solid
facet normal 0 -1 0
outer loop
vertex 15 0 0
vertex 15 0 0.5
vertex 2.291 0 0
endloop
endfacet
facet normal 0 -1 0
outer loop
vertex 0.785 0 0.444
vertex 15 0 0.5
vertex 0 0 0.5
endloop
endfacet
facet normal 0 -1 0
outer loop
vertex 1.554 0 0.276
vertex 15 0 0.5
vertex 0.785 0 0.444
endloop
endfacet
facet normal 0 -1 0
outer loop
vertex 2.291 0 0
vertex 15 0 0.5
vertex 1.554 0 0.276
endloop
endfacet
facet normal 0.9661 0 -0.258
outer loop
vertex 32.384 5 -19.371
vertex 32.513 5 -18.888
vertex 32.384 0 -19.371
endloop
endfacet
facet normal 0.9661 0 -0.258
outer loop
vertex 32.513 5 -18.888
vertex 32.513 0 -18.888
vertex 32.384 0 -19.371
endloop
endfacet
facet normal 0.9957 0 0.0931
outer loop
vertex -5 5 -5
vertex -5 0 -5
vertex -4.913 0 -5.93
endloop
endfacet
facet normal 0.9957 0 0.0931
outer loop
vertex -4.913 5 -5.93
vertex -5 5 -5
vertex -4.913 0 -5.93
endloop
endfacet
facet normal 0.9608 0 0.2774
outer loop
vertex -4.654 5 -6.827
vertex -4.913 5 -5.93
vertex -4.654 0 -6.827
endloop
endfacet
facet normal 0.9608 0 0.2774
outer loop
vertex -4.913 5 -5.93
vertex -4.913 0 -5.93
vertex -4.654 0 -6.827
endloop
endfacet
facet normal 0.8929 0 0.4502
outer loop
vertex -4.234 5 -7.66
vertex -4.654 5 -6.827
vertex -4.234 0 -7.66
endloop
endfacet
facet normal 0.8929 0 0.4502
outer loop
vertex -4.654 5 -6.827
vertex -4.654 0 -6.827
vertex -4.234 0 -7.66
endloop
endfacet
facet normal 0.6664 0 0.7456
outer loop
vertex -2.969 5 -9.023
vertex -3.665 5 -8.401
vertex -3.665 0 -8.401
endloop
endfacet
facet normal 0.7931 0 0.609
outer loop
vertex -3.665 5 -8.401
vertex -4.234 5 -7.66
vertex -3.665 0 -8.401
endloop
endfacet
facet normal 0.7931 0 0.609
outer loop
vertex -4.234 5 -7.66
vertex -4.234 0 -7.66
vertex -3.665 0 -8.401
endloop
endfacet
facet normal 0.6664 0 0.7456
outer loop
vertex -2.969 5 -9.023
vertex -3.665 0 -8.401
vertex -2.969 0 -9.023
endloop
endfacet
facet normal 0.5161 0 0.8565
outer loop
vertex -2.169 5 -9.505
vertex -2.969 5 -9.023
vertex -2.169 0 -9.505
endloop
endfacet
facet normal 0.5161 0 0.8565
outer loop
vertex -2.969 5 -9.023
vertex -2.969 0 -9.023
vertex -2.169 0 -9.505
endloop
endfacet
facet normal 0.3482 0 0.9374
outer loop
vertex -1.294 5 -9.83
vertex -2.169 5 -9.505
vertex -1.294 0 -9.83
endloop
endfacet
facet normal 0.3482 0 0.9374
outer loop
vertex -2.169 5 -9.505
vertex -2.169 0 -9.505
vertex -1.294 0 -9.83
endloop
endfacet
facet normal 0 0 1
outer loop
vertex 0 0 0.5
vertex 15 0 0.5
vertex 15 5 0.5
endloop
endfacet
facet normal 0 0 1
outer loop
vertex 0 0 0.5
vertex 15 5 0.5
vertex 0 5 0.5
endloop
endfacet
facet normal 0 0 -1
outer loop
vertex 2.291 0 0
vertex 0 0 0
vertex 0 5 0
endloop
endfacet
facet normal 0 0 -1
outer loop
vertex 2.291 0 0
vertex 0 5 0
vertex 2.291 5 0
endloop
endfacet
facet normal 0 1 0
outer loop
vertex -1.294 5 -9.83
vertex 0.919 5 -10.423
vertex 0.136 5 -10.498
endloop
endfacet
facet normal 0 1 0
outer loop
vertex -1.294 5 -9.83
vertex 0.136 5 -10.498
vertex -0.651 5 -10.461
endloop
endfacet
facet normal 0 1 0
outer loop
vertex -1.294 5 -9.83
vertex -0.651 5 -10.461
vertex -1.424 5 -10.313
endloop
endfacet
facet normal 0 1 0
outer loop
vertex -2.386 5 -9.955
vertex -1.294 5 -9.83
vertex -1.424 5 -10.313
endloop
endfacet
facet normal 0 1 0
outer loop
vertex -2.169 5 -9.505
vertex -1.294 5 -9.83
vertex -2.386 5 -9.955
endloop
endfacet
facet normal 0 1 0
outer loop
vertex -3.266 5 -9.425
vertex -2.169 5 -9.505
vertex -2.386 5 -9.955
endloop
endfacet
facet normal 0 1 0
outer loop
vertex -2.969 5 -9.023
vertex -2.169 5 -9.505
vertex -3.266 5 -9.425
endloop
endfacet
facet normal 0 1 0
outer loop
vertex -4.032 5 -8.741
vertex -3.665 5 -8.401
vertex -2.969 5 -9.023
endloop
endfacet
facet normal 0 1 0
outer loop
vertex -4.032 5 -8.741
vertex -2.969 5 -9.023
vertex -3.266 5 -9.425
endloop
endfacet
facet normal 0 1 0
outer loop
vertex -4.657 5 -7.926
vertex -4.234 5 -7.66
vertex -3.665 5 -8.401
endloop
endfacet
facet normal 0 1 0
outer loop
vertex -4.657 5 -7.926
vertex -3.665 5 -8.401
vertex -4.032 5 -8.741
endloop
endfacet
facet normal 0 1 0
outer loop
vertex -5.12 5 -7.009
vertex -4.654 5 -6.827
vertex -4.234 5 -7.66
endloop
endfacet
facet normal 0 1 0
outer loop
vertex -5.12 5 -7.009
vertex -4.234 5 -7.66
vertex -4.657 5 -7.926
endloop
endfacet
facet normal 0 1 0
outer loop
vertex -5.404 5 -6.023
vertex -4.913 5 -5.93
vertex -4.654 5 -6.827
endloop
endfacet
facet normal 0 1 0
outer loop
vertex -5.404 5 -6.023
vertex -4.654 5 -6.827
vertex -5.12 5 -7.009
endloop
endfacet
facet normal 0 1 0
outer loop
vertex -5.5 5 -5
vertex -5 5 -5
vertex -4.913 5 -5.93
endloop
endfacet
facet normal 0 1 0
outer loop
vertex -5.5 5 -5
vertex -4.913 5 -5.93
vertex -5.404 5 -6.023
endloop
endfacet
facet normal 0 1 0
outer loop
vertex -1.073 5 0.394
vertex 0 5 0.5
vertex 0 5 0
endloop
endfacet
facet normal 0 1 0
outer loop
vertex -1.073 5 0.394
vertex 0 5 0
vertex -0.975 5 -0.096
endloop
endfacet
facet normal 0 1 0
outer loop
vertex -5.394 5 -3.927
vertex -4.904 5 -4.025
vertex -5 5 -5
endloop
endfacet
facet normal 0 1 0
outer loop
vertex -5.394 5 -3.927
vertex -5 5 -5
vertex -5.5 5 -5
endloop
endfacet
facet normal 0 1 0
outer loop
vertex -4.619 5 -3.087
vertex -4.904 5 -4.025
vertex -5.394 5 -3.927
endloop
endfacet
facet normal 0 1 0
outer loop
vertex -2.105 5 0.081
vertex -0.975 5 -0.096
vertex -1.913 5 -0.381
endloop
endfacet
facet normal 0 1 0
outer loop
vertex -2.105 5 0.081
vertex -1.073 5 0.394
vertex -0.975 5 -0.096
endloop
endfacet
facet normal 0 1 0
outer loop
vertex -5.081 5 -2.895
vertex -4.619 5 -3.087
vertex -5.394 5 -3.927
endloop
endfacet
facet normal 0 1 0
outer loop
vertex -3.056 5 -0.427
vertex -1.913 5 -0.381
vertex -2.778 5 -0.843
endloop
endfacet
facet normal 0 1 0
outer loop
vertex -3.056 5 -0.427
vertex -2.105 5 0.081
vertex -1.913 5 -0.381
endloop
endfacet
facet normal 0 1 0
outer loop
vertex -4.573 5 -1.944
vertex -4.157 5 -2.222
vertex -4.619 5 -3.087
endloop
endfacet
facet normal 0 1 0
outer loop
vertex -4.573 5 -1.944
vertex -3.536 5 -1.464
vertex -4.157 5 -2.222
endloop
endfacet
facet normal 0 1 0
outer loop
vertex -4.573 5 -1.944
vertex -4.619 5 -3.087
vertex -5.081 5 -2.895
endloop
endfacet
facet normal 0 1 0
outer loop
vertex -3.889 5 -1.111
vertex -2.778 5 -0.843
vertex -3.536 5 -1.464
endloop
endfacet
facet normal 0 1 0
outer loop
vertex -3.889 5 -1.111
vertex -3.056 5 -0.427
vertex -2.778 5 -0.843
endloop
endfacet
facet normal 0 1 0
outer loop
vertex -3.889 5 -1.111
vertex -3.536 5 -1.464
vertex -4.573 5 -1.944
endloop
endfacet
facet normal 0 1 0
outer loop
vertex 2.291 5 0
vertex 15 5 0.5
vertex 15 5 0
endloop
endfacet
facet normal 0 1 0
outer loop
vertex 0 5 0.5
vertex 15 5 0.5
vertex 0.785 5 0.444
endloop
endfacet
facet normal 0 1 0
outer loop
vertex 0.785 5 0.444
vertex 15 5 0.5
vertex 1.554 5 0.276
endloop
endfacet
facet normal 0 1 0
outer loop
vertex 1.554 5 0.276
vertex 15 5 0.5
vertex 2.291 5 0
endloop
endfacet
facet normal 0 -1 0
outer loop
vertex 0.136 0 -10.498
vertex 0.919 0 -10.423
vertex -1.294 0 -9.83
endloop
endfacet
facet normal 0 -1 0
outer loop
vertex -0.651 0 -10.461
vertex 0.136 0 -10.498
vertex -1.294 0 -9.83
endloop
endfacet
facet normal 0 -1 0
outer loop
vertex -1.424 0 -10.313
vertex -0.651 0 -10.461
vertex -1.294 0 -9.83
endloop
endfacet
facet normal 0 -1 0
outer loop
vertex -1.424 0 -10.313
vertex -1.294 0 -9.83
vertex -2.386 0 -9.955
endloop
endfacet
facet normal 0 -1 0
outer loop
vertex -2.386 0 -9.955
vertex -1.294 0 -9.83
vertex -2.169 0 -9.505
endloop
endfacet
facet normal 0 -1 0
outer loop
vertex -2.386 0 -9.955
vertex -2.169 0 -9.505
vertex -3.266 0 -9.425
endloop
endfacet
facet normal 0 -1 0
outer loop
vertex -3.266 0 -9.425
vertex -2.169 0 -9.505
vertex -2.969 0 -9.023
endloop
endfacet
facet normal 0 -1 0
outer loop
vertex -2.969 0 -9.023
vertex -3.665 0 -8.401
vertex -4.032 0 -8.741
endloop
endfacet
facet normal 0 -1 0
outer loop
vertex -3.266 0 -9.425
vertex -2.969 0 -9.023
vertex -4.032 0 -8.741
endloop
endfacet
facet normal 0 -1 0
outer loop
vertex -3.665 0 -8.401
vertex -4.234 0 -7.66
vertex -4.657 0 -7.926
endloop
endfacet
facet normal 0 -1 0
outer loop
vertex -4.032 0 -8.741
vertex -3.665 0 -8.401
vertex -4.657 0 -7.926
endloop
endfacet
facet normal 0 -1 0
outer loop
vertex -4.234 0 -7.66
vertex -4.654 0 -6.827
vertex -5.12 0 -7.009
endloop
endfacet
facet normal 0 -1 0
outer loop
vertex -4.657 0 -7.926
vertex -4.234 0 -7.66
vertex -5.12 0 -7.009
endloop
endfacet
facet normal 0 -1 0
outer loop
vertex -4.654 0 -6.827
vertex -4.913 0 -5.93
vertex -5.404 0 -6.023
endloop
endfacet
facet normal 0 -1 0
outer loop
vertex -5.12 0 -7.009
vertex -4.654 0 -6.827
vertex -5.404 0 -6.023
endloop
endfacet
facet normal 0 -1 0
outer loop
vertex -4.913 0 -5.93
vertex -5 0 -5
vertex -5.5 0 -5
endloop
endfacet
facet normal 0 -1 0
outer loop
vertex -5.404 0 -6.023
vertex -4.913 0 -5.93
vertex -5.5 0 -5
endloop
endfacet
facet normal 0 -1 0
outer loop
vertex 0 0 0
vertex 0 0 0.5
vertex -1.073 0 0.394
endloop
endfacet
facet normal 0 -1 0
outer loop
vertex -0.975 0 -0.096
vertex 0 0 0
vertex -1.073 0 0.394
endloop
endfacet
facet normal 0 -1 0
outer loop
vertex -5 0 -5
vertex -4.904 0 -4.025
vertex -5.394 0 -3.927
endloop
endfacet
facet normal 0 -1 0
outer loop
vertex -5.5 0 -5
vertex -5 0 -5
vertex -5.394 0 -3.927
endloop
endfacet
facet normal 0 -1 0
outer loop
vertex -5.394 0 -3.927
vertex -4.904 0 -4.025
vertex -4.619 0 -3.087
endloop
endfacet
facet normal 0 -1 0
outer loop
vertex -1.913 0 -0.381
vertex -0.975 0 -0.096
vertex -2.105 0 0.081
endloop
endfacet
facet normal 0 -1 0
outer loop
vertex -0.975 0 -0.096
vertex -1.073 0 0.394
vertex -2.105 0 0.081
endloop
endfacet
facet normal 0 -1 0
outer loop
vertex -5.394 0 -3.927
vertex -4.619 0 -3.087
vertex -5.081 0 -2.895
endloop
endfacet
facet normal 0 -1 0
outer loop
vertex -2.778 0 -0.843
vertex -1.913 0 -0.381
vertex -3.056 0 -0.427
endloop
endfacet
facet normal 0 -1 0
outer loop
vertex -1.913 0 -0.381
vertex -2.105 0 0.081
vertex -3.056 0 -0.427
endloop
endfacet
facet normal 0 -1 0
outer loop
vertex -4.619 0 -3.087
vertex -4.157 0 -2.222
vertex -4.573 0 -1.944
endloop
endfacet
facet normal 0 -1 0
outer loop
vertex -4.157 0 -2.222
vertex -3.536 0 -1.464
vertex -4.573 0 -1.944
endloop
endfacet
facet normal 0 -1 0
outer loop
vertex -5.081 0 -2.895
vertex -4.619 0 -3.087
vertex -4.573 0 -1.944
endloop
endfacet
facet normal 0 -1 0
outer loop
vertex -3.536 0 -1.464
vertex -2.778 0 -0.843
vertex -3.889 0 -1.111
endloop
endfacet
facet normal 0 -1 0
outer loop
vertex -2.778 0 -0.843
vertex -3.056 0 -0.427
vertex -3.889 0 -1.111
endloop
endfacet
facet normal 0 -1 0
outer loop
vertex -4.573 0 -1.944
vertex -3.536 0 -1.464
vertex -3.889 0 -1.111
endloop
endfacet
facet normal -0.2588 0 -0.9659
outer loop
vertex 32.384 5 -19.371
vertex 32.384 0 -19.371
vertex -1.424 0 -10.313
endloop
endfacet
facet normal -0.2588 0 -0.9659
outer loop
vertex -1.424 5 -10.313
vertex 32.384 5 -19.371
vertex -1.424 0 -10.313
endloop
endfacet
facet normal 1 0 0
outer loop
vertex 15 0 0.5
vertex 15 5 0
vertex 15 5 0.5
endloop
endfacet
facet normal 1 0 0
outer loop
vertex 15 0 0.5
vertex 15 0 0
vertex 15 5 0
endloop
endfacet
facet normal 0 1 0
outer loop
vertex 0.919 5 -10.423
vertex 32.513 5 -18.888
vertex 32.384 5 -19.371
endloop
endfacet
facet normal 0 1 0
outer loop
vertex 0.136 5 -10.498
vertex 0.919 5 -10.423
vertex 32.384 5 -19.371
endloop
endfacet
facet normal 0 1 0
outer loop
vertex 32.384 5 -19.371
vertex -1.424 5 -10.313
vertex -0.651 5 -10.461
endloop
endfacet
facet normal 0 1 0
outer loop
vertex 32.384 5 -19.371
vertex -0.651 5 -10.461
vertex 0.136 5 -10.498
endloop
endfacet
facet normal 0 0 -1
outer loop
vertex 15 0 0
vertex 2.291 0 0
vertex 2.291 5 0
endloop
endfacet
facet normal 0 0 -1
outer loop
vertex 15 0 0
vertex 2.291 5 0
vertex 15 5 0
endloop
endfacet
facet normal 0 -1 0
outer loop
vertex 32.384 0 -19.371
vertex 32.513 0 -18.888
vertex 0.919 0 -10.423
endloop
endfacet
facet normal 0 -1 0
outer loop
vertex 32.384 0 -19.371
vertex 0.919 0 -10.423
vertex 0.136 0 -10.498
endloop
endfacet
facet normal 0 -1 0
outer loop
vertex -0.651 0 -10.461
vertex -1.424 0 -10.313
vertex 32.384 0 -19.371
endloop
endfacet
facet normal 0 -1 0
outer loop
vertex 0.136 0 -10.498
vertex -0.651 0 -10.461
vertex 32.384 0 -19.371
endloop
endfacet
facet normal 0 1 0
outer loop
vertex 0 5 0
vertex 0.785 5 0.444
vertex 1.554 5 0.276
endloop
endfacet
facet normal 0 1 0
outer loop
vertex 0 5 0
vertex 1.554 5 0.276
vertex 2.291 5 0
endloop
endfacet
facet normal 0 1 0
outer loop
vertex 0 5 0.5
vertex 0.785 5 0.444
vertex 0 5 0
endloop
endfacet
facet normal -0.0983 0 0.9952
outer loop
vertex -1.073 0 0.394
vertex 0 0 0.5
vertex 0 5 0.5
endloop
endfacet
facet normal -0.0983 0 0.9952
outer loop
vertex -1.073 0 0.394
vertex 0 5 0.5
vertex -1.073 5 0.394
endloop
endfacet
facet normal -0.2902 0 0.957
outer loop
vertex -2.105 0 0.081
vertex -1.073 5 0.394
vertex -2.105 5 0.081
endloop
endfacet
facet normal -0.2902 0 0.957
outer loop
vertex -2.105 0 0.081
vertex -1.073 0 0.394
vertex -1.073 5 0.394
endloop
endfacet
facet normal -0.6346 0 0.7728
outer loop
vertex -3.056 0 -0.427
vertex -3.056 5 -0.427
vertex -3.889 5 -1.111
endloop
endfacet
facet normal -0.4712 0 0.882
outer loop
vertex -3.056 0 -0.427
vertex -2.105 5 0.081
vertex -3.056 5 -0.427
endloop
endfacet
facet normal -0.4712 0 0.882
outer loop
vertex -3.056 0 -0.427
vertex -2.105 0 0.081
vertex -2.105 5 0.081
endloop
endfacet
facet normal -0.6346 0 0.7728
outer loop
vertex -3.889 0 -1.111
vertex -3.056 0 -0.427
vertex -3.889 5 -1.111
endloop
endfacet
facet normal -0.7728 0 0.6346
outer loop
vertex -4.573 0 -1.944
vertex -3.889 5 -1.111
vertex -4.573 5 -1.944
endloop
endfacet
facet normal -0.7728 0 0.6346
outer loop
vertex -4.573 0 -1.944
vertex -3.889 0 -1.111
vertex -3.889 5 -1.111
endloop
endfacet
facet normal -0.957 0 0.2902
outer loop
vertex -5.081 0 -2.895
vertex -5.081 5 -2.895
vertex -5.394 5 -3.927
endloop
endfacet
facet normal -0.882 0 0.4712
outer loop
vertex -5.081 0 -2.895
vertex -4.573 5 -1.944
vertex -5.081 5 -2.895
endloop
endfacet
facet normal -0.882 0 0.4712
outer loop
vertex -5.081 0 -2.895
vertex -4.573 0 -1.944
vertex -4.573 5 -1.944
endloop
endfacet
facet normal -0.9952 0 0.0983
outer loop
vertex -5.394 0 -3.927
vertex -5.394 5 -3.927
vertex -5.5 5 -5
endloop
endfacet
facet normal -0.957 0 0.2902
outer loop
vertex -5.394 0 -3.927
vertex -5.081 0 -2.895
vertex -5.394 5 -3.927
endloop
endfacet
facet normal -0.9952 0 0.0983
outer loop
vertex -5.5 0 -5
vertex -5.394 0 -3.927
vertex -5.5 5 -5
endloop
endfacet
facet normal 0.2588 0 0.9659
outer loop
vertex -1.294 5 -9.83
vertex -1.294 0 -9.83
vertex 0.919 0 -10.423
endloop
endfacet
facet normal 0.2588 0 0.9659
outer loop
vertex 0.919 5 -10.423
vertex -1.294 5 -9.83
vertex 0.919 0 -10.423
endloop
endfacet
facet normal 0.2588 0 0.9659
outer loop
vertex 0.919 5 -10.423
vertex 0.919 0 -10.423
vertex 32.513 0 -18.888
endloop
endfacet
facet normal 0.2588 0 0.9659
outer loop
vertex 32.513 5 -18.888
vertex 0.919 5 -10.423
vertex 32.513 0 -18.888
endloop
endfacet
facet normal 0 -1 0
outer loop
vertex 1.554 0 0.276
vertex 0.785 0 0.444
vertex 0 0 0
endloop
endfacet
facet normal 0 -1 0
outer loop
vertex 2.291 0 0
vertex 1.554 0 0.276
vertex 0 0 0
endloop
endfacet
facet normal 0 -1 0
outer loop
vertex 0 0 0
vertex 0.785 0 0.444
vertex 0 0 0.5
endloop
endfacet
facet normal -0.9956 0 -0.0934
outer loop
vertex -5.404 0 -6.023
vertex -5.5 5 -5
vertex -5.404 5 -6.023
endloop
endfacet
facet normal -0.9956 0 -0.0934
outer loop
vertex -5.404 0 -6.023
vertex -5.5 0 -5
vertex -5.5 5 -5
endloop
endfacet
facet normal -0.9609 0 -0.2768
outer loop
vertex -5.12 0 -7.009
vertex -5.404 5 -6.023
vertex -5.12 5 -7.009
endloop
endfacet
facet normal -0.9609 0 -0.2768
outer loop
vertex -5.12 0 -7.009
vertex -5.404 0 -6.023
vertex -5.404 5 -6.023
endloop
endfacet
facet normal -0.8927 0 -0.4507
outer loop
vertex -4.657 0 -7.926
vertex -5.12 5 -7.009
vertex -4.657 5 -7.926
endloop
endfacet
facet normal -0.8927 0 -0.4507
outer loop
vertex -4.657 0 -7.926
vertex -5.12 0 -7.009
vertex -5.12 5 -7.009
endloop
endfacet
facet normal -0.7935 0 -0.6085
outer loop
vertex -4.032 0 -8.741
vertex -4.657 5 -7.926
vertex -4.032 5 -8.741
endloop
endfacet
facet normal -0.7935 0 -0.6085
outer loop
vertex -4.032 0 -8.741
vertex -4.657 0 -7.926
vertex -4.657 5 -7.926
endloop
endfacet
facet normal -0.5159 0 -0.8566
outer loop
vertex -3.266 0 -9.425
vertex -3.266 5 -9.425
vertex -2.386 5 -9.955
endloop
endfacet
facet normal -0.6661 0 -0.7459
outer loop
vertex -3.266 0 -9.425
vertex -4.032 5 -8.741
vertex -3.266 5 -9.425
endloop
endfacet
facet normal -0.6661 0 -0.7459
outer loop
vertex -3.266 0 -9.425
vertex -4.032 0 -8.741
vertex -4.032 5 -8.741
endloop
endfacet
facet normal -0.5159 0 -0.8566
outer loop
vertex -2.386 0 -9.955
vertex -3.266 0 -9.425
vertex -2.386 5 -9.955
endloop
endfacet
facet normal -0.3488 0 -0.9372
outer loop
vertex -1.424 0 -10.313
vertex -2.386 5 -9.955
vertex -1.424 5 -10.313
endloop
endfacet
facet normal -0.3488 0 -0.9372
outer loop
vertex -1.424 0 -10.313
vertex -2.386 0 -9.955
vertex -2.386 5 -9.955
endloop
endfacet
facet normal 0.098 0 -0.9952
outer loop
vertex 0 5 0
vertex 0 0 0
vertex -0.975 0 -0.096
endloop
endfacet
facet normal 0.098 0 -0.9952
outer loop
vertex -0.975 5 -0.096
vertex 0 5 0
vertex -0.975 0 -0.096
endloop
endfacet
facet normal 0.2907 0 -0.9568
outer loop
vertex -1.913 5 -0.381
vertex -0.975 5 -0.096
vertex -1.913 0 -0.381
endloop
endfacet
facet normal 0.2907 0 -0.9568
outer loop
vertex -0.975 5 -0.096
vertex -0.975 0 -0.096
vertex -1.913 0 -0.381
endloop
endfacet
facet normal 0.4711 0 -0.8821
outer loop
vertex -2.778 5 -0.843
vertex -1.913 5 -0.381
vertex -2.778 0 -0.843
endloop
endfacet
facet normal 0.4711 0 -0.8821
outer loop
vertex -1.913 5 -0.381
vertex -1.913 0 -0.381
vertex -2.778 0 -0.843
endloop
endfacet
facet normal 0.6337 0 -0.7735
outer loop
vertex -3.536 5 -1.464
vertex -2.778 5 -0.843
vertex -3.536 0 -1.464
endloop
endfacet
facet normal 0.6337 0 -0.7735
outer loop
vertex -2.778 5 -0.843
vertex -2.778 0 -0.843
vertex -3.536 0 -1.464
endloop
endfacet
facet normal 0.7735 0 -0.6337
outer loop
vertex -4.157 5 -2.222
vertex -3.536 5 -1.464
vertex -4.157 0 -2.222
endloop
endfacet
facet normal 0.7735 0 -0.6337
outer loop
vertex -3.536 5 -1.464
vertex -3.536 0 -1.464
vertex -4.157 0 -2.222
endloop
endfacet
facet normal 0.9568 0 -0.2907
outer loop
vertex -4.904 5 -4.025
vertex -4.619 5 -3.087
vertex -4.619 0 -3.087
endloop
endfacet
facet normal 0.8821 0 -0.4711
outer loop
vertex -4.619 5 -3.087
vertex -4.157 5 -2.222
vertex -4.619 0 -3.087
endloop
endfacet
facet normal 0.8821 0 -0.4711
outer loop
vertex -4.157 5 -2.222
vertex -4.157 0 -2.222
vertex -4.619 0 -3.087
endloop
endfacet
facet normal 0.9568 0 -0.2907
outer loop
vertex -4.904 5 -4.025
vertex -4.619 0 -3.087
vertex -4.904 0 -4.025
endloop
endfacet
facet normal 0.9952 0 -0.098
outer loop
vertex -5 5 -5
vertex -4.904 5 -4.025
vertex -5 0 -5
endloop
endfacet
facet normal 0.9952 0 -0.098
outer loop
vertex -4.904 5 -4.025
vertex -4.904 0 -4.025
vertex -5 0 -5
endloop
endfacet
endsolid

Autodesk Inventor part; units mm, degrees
ref_plane "YZ Plane" through (0, 0, 0) normal (1, 0, 0) x (0, 1, 0)
ref_plane "XZ Plane" through (0, 0, 0) normal (0, 1, 0) x (-1, 0, 0)
ref_plane "XY Plane" through (0, 0, 0) normal (0, 0, 1) x (1, 0, 0)
sketch "スケッチ1" plane through (0, 0, 0) normal (0, 1, 0) x (-1, 0, 0)
  line L0 (0, 0) -> (-15, 0)
  line L1 (-15, 0) -> (-15, 0.5)
  line L2 (-15, 0.5) -> (0, 0.5)
  line L3 (0, 0.5) -> (0, 0)
  circle A0 centre (0, -5) radius 5
  circle A1 centre (0, -5) radius 5.5
  line L4 (1.2941, -9.8296) -> (-32.5133, -18.8883)
  line L5 (-32.5133, -18.8883) -> (-32.3839, -19.3713)
  line L6 (-32.3839, -19.3713) -> (1.4235, -10.3126)
  point P0 (-0.2935, -9.9914)
  point P1 (-0.9191, -10.4227)
  point P2 (-2.2913, 0)
  dimension "d3" = 10
  dimension "d2" = 11
  dimension "d4" = 15
  dimension "d5" = 35
  dimension "d6" = 15
extrude "押し出し1" add sketch "スケッチ1" along normal blind 5 contours L0 A1 L3 | L3 A1 L4 A0 | L0 L1 L2 A1 | A1 L6 L5 L4
properties part number "bend_sensor"
